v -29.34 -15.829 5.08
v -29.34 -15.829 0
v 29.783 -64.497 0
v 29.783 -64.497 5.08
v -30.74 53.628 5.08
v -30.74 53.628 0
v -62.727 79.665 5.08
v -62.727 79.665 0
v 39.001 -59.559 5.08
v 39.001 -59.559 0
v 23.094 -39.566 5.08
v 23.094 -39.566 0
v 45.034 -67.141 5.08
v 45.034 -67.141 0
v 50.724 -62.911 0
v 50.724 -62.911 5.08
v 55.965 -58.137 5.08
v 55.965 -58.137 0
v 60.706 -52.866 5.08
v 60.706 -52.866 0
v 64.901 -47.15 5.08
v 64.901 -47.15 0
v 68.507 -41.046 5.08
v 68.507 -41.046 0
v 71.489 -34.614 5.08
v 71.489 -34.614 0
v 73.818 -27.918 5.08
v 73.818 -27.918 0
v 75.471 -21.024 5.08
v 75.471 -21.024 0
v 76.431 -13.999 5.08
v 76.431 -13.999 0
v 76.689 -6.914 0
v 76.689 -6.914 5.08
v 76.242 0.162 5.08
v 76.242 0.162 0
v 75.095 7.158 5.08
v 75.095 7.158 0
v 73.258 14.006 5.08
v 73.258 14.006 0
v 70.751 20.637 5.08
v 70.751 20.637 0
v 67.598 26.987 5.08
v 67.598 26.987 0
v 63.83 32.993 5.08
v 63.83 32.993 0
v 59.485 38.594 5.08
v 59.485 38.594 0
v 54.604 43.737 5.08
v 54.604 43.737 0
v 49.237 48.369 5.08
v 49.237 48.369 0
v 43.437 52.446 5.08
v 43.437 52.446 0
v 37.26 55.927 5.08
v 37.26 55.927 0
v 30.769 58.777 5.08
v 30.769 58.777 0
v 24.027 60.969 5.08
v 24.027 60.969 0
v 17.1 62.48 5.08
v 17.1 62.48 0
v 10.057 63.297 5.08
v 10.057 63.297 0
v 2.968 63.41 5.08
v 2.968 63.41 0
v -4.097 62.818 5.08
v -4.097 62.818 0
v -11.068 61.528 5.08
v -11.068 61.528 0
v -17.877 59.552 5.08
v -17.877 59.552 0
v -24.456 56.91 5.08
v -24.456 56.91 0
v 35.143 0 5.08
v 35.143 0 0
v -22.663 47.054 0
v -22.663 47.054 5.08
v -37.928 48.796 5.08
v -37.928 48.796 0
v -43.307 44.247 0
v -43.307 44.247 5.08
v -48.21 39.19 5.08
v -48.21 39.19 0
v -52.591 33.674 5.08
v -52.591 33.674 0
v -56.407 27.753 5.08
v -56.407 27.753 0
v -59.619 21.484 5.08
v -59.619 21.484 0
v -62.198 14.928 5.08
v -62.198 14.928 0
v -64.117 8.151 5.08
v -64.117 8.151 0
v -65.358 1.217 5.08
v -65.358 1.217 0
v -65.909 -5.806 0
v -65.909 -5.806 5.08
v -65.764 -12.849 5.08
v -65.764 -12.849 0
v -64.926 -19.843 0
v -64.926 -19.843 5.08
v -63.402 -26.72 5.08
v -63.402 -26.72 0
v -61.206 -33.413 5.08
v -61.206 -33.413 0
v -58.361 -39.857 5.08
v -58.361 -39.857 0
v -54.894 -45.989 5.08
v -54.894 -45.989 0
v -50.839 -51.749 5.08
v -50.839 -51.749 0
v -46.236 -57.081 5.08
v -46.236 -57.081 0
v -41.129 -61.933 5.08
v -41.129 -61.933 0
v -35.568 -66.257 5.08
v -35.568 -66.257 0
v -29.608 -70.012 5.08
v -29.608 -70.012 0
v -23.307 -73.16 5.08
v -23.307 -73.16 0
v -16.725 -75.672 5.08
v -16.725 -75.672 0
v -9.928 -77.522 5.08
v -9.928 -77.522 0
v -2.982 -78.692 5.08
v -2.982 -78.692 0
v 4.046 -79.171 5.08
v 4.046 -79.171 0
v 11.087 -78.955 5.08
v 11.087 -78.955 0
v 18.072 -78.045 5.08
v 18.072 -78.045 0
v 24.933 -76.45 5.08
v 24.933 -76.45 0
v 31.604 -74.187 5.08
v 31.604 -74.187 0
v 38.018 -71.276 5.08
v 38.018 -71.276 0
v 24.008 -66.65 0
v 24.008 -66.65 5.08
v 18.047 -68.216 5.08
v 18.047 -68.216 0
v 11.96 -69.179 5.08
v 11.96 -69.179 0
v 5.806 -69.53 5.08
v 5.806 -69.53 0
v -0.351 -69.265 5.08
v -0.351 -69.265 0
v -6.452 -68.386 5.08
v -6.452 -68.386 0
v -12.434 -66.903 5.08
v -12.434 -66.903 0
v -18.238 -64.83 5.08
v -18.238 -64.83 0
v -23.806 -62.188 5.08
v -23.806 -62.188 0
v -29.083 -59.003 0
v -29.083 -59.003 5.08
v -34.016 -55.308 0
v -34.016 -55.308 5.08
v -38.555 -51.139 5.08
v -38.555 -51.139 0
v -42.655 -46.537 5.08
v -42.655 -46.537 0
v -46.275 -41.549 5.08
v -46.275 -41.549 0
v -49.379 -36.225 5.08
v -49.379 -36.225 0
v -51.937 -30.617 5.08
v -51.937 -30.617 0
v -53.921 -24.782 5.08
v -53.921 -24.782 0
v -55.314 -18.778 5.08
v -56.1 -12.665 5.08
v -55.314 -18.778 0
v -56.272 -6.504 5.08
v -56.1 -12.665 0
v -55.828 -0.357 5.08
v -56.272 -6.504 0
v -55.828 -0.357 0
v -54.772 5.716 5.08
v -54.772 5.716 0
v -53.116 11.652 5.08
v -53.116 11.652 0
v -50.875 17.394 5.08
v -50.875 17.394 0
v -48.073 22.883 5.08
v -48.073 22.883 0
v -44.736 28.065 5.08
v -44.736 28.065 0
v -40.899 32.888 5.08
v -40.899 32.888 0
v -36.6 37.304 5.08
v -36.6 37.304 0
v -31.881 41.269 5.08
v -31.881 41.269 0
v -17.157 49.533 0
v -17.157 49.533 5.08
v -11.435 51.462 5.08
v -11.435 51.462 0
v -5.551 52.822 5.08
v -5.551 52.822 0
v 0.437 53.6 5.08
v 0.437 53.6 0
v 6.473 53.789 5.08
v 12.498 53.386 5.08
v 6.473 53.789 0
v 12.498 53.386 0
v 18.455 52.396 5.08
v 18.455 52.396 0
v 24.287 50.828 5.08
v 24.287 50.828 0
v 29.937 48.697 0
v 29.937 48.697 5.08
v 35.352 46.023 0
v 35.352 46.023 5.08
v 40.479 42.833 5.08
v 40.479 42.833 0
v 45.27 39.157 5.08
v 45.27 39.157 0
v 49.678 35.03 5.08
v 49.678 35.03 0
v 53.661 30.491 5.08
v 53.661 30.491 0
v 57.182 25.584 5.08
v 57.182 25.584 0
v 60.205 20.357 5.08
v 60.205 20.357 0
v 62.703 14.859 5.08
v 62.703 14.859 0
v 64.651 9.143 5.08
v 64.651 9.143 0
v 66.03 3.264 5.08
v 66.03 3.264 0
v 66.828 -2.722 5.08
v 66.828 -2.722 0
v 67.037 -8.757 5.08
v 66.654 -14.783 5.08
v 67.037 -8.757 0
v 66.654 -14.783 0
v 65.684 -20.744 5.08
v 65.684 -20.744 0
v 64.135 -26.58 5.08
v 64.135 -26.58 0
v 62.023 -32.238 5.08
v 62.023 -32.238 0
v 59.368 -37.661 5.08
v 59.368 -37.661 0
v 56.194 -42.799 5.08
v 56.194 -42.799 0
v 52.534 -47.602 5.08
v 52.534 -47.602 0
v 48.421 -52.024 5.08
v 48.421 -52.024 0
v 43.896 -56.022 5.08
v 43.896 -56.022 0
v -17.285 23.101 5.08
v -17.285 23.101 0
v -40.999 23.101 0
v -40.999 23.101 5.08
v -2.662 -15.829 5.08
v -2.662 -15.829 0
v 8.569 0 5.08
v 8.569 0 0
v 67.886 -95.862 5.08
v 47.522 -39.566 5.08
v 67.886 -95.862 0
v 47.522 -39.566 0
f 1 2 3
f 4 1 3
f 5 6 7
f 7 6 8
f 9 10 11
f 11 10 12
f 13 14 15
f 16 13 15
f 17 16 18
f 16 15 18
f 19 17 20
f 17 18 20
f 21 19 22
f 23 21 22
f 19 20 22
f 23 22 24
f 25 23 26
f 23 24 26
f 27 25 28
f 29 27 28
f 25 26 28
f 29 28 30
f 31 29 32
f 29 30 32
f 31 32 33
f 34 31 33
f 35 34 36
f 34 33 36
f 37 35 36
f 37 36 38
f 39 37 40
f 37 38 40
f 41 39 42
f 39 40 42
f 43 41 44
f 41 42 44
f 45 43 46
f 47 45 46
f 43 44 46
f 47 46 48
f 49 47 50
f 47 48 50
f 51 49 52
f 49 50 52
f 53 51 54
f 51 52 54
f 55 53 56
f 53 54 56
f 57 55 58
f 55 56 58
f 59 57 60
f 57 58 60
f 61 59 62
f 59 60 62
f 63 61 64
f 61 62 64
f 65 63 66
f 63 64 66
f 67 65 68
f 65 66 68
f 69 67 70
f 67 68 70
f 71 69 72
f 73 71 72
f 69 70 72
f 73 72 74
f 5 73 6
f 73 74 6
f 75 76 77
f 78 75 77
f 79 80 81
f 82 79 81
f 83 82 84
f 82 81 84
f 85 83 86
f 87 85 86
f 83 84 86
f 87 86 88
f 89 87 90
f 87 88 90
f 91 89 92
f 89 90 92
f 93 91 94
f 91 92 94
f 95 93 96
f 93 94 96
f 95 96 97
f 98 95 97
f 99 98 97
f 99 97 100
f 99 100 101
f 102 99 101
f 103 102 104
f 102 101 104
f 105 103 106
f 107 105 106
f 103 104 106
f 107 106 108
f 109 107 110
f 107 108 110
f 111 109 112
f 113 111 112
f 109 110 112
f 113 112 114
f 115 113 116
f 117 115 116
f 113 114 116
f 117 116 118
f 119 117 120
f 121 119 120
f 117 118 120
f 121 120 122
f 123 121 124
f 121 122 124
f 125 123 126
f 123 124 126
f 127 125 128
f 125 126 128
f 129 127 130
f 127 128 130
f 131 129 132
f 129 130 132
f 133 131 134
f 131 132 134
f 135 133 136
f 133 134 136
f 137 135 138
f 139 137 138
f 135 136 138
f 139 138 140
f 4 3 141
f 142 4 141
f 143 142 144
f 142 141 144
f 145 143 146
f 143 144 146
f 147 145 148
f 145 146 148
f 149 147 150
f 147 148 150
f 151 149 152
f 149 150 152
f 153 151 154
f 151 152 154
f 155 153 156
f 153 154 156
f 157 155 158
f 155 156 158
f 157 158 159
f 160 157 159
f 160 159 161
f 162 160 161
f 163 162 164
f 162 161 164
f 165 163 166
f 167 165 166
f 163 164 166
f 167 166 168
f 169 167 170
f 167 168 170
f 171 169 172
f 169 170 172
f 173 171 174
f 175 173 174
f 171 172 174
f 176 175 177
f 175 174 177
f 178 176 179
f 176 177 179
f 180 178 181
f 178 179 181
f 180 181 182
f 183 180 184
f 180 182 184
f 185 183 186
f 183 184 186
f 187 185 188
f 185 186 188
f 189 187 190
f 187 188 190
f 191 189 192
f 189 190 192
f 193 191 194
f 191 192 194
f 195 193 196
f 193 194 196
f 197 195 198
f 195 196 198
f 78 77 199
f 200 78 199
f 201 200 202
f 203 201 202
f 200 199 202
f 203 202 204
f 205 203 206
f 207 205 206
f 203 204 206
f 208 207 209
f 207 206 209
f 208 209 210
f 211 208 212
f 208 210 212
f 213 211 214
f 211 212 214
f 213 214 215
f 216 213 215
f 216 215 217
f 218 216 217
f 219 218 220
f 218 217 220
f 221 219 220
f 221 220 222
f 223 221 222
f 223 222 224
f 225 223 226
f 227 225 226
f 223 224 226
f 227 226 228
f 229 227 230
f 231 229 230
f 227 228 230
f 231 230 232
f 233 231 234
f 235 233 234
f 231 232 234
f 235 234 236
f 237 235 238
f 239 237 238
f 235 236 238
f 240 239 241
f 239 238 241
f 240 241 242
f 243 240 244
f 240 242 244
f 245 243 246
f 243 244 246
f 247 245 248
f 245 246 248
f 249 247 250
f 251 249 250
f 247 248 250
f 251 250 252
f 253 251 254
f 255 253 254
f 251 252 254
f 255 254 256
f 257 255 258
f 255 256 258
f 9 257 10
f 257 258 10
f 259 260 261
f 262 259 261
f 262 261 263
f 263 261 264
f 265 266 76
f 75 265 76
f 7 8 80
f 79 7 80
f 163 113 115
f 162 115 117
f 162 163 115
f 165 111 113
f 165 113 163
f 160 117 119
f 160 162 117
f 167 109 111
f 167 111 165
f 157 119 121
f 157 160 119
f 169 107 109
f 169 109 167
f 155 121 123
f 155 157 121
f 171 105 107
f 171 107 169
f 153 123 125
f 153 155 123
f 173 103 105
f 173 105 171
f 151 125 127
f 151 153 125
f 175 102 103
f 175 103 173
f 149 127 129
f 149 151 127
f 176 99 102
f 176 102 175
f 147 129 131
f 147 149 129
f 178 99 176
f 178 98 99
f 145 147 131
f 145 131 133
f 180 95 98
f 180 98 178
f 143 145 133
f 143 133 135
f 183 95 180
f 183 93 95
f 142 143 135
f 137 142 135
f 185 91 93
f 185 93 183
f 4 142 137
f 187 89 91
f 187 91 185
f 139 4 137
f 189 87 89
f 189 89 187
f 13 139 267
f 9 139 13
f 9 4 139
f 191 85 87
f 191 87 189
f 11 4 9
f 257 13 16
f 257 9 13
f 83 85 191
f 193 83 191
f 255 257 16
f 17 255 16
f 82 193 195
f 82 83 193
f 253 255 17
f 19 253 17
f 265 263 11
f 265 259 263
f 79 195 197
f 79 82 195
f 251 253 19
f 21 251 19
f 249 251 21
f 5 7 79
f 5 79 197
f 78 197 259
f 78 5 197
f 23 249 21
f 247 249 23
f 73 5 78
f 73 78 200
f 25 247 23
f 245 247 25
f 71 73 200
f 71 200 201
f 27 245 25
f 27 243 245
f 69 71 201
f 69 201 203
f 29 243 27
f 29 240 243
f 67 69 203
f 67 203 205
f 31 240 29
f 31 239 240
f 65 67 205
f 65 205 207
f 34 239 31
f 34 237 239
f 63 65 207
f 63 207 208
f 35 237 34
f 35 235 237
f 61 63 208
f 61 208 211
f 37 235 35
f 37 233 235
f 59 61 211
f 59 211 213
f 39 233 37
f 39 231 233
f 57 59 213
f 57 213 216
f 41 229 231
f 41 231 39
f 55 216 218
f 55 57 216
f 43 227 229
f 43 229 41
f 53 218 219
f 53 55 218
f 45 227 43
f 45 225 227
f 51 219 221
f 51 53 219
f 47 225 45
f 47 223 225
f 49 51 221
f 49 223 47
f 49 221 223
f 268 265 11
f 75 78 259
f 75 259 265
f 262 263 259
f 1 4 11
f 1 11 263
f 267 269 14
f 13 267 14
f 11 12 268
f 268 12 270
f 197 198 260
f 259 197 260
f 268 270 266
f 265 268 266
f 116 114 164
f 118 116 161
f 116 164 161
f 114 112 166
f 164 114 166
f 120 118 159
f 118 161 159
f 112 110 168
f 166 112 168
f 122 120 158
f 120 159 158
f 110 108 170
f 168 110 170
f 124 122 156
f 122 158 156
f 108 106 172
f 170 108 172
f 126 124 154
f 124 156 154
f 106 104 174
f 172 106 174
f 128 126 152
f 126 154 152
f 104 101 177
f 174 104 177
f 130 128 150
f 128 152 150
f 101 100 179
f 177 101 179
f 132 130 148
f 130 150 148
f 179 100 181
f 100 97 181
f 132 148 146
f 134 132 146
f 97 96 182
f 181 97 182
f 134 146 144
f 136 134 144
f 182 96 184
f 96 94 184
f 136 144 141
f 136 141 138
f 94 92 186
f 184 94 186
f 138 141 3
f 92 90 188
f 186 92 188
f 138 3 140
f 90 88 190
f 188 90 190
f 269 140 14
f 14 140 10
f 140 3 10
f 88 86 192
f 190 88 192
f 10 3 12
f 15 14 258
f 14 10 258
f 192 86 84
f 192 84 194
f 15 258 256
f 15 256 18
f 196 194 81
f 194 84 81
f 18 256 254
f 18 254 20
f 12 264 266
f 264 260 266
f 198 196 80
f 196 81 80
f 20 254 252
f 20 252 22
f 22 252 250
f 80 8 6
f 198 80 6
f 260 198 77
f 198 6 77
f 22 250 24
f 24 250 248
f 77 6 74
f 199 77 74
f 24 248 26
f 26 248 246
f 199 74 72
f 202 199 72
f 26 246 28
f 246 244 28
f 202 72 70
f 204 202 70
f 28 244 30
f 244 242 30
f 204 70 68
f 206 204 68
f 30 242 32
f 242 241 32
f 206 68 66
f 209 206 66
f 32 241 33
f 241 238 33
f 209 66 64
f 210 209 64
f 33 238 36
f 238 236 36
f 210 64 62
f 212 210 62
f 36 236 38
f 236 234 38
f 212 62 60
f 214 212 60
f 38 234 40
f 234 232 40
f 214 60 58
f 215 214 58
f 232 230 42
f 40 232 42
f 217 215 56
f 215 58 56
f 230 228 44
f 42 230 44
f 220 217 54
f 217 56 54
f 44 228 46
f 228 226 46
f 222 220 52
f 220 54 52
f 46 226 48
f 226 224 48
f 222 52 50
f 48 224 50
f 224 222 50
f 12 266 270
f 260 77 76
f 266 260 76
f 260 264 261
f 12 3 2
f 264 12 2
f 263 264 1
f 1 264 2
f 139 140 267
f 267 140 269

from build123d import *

# Parameters (mm, degrees)
F1_DEPTH = 5.08


with BuildPart() as f1:
    # F0 (on Top) → F1 (new body)
    with BuildSketch(Plane.XY):
        Polygon((-30.73996, 53.627926), (-62.727489, 79.665363), (-37.928027, 48.796157), (-31.880961, 41.269053), (-17.285284, 23.101039), (-40.998805, 23.101039), (-2.661946, -15.828654), (-29.339654, -15.828654), (29.78309, -64.496771), (38.018424, -71.275857), (67.885771, -95.861785), (45.034323, -67.141476), (39.001086, -59.558743), (23.094157, -39.566491), (47.522068, -39.566491), (8.569453, 0), (35.143055, 0), (-22.663309, 47.053636), align=None)
        with BuildLine():
            Line((-31.880961, 41.269053), (-37.928027, 48.796157))
            ThreePointArc((-37.928027, 48.796157), (-54.894131, -45.989389), (38.018424, -71.275857))
            Line((38.018424, -71.275857), (29.78309, -64.496771))
            ThreePointArc((29.78309, -64.496771), (-47.893768, -38.925538), (-31.880961, 41.269053))
        make_face()
        with BuildLine():
            ThreePointArc((45.034323, -67.141476), (65.788888, 30.03676), (-30.73996, 53.627926))
            Line((-30.73996, 53.627926), (-22.663309, 47.053636))
            ThreePointArc((-22.663309, 47.053636), (58.757468, 23.007783), (39.001086, -59.558743))
            Line((39.001086, -59.558743), (45.034323, -67.141476))
        make_face()
    extrude(amount=F1_DEPTH)


solid = f1.part
